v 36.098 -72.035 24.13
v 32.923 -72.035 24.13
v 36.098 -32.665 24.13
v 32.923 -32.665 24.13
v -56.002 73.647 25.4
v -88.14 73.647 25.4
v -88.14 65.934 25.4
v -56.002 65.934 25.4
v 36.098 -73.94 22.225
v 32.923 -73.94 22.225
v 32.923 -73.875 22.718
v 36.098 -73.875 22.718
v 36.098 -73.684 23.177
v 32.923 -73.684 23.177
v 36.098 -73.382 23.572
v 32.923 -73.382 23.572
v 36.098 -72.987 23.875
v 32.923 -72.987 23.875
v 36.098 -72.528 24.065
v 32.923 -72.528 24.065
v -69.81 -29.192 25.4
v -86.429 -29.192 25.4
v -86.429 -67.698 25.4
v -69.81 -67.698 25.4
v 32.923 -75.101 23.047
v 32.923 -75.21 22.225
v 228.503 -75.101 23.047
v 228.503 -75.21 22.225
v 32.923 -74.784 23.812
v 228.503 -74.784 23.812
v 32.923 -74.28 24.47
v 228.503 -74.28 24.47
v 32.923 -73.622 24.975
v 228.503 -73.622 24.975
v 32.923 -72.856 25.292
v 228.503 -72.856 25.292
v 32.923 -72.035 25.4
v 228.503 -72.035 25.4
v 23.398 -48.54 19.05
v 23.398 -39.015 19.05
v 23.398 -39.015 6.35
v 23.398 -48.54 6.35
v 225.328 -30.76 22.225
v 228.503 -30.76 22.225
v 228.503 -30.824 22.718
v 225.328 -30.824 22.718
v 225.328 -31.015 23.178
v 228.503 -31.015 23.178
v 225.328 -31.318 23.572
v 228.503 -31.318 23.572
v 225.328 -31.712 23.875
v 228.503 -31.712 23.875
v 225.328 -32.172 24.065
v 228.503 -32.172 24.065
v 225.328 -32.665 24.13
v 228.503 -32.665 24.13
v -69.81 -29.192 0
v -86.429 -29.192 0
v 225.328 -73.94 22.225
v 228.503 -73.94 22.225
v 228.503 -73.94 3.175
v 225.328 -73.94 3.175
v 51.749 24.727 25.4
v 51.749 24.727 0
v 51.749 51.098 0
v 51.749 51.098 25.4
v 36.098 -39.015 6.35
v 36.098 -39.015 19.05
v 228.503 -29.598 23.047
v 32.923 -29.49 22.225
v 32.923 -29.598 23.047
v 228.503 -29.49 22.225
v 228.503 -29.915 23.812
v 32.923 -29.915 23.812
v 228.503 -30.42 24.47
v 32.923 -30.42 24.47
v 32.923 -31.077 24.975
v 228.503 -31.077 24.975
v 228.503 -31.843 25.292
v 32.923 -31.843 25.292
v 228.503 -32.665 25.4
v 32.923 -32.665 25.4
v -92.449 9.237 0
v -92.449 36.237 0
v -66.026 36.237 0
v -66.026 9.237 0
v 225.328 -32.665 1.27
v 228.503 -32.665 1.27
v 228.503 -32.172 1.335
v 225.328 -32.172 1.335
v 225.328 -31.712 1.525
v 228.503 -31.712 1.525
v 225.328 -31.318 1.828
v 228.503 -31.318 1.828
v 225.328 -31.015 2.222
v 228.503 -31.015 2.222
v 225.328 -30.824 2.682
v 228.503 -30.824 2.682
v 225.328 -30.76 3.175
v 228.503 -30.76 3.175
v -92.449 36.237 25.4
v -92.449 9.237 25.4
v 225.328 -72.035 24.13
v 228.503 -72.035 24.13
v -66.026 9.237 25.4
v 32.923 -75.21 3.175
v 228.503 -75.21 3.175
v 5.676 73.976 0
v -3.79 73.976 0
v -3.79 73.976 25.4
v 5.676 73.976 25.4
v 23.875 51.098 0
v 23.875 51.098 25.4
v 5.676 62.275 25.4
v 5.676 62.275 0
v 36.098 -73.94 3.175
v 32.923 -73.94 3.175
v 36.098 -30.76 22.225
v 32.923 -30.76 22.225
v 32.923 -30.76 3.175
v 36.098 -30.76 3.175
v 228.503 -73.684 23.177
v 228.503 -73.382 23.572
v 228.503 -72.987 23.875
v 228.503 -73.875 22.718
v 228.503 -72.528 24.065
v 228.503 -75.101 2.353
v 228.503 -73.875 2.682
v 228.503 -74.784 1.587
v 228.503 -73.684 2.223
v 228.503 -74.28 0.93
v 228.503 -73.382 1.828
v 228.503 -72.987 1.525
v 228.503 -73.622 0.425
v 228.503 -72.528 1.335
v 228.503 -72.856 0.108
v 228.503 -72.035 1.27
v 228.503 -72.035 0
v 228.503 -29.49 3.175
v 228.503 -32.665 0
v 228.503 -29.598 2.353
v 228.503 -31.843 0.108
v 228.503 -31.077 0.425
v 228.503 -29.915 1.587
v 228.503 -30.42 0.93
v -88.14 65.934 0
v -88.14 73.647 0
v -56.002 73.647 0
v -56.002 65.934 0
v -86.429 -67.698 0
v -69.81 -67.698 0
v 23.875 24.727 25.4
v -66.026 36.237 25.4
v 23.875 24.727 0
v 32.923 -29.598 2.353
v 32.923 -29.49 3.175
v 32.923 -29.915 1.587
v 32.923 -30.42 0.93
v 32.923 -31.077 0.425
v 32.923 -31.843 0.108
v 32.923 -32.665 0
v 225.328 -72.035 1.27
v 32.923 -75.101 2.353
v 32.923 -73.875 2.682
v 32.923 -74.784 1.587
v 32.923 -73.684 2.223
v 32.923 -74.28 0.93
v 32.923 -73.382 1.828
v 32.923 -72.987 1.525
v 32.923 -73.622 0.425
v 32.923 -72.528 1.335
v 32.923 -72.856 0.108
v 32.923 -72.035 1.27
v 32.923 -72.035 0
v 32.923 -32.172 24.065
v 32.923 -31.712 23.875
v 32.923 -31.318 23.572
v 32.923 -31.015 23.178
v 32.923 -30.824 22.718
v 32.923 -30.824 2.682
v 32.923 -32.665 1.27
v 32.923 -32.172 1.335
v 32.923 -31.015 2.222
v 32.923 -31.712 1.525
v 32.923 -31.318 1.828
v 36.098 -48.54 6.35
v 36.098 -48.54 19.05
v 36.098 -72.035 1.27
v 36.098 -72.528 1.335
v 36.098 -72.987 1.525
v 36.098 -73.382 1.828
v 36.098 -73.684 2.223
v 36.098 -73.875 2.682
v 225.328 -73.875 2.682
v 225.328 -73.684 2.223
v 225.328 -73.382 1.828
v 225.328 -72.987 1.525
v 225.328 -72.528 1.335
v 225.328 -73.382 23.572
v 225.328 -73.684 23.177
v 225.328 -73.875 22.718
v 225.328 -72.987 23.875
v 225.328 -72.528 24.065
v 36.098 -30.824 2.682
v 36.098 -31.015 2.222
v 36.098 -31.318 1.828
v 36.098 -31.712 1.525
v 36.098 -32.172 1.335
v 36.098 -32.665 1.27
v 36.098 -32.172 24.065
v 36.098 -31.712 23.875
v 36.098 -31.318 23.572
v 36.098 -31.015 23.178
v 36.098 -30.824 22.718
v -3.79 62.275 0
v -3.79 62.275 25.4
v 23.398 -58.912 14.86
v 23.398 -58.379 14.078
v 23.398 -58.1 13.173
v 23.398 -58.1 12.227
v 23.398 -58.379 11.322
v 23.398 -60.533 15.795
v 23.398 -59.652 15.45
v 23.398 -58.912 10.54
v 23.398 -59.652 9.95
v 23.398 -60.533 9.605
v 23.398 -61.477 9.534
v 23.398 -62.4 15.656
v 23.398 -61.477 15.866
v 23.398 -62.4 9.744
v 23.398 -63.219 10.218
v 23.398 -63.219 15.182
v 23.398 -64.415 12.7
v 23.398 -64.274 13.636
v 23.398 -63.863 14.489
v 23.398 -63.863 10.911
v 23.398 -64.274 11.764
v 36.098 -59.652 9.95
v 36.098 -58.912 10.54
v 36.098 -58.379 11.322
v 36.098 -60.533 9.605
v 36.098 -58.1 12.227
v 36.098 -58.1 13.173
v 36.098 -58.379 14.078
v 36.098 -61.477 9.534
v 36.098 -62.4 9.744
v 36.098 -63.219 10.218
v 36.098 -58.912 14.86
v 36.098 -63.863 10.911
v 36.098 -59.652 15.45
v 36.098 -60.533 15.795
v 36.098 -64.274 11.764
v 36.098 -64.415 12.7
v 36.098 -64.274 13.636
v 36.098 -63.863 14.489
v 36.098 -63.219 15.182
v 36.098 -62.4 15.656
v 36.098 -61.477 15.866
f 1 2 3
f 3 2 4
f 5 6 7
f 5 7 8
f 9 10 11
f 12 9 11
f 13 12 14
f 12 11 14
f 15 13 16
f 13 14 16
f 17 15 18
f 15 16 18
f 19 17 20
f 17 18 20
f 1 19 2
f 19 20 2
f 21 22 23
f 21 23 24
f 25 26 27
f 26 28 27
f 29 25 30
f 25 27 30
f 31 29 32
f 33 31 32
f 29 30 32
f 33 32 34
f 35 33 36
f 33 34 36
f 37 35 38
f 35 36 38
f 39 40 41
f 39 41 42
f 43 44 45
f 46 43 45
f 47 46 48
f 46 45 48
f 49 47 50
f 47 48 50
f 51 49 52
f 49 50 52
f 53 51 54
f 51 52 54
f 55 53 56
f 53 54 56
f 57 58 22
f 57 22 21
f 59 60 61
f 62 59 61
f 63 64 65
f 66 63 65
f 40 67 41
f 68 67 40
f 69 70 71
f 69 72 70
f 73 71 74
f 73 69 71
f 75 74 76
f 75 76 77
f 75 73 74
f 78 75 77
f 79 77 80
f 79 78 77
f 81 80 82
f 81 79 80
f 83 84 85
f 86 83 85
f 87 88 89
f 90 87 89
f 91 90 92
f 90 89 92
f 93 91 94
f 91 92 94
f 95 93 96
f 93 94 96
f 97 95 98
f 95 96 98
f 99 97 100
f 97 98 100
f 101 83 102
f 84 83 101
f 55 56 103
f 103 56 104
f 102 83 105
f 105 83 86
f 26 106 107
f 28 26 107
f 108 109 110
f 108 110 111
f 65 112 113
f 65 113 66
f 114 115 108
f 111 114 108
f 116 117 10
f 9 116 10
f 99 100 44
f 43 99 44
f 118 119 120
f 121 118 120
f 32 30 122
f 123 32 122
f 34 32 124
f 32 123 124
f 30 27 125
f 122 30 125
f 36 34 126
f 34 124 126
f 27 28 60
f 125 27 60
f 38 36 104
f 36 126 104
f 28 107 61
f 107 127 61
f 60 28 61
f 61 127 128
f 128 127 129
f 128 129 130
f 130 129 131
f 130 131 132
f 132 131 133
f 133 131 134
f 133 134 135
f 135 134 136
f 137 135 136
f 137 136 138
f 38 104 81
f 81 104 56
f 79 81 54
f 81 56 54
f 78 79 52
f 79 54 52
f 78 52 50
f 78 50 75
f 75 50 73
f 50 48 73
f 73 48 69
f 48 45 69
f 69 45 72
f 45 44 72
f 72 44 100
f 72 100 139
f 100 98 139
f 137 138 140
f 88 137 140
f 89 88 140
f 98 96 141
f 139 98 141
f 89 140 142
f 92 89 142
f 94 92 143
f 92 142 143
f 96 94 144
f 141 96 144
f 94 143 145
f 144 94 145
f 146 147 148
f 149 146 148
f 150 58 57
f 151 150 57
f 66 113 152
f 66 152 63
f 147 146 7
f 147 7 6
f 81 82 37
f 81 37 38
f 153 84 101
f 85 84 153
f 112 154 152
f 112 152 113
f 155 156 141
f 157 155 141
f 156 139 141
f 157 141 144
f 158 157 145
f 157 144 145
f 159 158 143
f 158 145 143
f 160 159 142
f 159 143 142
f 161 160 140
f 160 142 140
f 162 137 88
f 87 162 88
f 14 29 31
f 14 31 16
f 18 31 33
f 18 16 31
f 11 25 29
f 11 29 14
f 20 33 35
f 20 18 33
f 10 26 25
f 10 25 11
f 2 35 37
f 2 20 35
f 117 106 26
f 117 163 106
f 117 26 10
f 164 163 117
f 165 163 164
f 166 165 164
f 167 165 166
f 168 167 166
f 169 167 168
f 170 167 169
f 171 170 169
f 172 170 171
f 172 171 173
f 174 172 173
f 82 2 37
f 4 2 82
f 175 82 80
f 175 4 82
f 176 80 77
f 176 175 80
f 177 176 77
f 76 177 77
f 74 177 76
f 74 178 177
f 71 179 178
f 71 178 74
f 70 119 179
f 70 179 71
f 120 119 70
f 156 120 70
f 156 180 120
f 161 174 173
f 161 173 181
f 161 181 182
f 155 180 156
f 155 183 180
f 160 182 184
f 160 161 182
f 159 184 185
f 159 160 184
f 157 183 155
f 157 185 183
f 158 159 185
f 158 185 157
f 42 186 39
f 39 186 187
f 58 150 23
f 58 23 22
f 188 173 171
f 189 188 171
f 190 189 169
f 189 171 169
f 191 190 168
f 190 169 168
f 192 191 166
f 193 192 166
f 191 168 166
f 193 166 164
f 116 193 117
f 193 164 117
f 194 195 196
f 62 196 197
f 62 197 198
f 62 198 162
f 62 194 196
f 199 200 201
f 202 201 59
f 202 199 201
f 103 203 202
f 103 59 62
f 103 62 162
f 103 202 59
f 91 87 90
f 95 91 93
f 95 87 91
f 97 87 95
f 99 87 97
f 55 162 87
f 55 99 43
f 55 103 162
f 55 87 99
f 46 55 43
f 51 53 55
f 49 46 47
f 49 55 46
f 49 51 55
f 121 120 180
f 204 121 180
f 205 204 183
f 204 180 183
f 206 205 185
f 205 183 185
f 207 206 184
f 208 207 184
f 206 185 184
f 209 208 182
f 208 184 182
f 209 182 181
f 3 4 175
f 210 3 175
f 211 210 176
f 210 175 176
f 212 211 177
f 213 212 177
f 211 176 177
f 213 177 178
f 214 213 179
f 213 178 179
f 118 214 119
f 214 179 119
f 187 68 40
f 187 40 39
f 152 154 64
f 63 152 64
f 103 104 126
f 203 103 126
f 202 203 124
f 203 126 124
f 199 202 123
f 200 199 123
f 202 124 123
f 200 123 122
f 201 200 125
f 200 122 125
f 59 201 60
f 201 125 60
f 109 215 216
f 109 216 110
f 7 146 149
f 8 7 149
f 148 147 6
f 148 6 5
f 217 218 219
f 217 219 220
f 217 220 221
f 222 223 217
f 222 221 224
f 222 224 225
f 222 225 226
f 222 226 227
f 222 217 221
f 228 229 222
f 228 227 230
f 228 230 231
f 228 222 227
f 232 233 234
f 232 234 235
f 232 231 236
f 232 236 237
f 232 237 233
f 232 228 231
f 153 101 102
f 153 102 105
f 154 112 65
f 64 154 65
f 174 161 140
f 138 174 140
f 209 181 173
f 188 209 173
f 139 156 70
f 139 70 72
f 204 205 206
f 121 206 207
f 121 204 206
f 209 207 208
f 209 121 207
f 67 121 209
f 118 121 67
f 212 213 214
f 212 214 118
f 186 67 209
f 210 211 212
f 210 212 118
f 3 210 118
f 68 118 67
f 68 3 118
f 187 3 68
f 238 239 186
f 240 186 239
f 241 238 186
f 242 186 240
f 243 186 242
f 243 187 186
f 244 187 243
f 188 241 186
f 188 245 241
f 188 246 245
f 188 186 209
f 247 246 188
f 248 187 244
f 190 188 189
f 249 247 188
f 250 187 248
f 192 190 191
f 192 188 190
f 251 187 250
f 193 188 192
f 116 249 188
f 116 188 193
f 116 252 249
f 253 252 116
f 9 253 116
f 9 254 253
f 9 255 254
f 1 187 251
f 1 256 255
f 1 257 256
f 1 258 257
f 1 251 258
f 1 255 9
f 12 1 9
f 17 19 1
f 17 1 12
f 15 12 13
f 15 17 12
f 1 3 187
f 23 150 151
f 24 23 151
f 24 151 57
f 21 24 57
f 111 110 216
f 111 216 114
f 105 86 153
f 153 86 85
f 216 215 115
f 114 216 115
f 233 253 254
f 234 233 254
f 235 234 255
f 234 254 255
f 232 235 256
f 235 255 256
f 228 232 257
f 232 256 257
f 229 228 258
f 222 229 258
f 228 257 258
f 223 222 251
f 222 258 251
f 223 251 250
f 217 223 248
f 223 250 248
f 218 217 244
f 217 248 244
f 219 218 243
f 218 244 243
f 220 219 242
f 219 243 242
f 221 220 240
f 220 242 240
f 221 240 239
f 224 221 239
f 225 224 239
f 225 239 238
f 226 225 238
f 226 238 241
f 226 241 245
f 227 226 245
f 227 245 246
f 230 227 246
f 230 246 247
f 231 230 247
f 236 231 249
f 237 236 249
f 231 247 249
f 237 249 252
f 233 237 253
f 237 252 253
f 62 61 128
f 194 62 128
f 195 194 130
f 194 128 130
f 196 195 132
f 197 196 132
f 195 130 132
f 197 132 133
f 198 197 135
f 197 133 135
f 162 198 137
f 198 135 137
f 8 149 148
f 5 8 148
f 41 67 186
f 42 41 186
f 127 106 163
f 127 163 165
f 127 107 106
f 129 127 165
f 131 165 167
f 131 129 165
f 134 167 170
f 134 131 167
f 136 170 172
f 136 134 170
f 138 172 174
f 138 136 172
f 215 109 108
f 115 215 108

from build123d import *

# Parameters (mm, degrees)
F0_W     = 16.618398
F0_H     = 38.506252
F0_W_2   = 26.423264
F0_H_2   = 27.000825
F0_W_3   = 32.138111
F0_H_3   = 7.713083
F0_W_4   = 9.466055
F0_H_4   = 11.701052
F0_W_5   = 27.874055
F0_H_5   = 26.37086
F0_W_6   = 195.58
F0_H_6   = 45.72
F1_DEPTH = 25.4
F2_R     = 3.175
F4_DEPTH = 3.175
F6_DEPTH = 3.175
F7_W     = 9.525
F7_H     = 12.7
F7_R     = 3.175
F8_DEPTH = 12.7


with BuildPart() as f1:
    # F0 (on Top) → F1 (new body)
    with BuildSketch(Plane.XY):
        with Locations((-78.119632, -48.44503)):
            Rectangle(F0_W, F0_H)
        with Locations((-79.23726, 22.737014)):
            Rectangle(F0_W_2, F0_H_2)
        with Locations((-72.070883, 69.790199)):
            Rectangle(F0_W_3, F0_H_3)
        with Locations((0.943256, 68.12576)):
            Rectangle(F0_W_4, F0_H_4)
        with Locations((37.811639, 37.912922)):
            Rectangle(F0_W_5, F0_H_5)
        with Locations((130.713382, -52.349573)):
            Rectangle(F0_W_6, F0_H_6)
    extrude(amount=F1_DEPTH)

    # F2
    f2_edges = [f1.edges().sort_by_distance(p)[0] for p in [
        (130.713382, -75.209573, 25.4),
        (130.713382, -75.209573, 0),
        (130.713382, -29.489573, 0),
        (130.713382, -29.489573, 25.4),
    ]]
    fillet(f2_edges, radius=F2_R)

    # F3 (on face) → F4 (cut)
    with BuildSketch(Plane.YZ.offset(228.503382)):
        with BuildLine():
            ThreePointArc((-73.939573, 22.225), (-72.034573, 20.32), (-70.129573, 22.225))
            ThreePointArc((-70.129573, 22.225), (-70.687534, 23.572038), (-72.034573, 24.13))
            ThreePointArc((-72.034573, 24.13), (-73.381611, 23.572038), (-73.939573, 22.225))
        make_face()
        with BuildLine():
            ThreePointArc((-72.034573, 24.13), (-70.687534, 23.572038), (-70.129573, 22.225))
            ThreePointArc((-70.129573, 22.225), (-72.034573, 20.32), (-73.939573, 22.225))
            Line((-73.939573, 22.225), (-73.939573, 3.175))
            ThreePointArc((-73.939573, 3.175), (-72.034573, 5.08), (-70.129573, 3.175))
            ThreePointArc((-70.129573, 3.175), (-70.687534, 1.827962), (-72.034573, 1.27))
            Line((-72.034573, 1.27), (-32.664573, 1.27))
            ThreePointArc((-32.664573, 1.27), (-34.011611, 4.522038), (-30.759573, 3.175))
            Line((-30.759573, 3.175), (-30.759573, 22.225))
            ThreePointArc((-30.759573, 22.225), (-34.011611, 20.877962), (-32.664573, 24.13))
            Line((-32.664573, 24.13), (-72.034573, 24.13))
        make_face()
        with BuildLine():
            ThreePointArc((-30.759573, 22.225), (-31.317534, 23.572038), (-32.664573, 24.13))
            ThreePointArc((-32.664573, 24.13), (-34.011611, 20.877962), (-30.759573, 22.225))
        make_face()
        with BuildLine():
            ThreePointArc((-70.129573, 3.175), (-72.034573, 5.08), (-73.939573, 3.175))
            ThreePointArc((-73.939573, 3.175), (-73.381611, 1.827962), (-72.034573, 1.27))
            ThreePointArc((-72.034573, 1.27), (-70.687534, 1.827962), (-70.129573, 3.175))
        make_face()
        with BuildLine():
            ThreePointArc((-32.664573, 1.27), (-31.317534, 1.827962), (-30.759573, 3.175))
            ThreePointArc((-30.759573, 3.175), (-34.011611, 4.522038), (-32.664573, 1.27))
        make_face()
    extrude(amount=-F4_DEPTH, mode=Mode.SUBTRACT)

    # F5 (on face) → F6 (cut)
    with BuildSketch(Plane(origin=(32.923382, 0, 0), x_dir=(0, -1, 0), z_dir=(-1, 0, 0))):
        with BuildLine():
            ThreePointArc((30.759573, 22.225), (32.664573, 20.32), (34.569573, 22.225))
            ThreePointArc((34.569573, 22.225), (34.011611, 23.572038), (32.664573, 24.13))
            ThreePointArc((32.664573, 24.13), (31.317534, 23.572038), (30.759573, 22.225))
        make_face()
        with BuildLine():
            ThreePointArc((32.664573, 24.13), (34.011611, 23.572038), (34.569573, 22.225))
            ThreePointArc((34.569573, 22.225), (32.664573, 20.32), (30.759573, 22.225))
            Line((30.759573, 22.225), (30.759573, 3.175))
            ThreePointArc((30.759573, 3.175), (32.664573, 5.08), (34.569573, 3.175))
            ThreePointArc((34.569573, 3.175), (34.011611, 1.827962), (32.664573, 1.27))
            Line((32.664573, 1.27), (72.034573, 1.27))
            ThreePointArc((72.034573, 1.27), (70.687534, 4.522038), (73.939573, 3.175))
            Line((73.939573, 3.175), (73.939573, 22.225))
            ThreePointArc((73.939573, 22.225), (70.687534, 20.877962), (72.034573, 24.13))
            Line((72.034573, 24.13), (32.664573, 24.13))
        make_face()
        with BuildLine():
            ThreePointArc((73.939573, 22.225), (73.381611, 23.572038), (72.034573, 24.13))
            ThreePointArc((72.034573, 24.13), (70.687534, 20.877962), (73.939573, 22.225))
        make_face()
        with BuildLine():
            ThreePointArc((34.569573, 3.175), (32.664573, 5.08), (30.759573, 3.175))
            ThreePointArc((30.759573, 3.175), (31.317534, 1.827962), (32.664573, 1.27))
            ThreePointArc((32.664573, 1.27), (34.011611, 1.827962), (34.569573, 3.175))
        make_face()
        with BuildLine():
            ThreePointArc((72.034573, 1.27), (73.381611, 1.827962), (73.939573, 3.175))
            ThreePointArc((73.939573, 3.175), (70.687534, 4.522038), (72.034573, 1.27))
        make_face()
    extrude(amount=-F6_DEPTH, mode=Mode.SUBTRACT)

    # F7 (on face) → F8 (join)
    with BuildSketch(Plane(origin=(36.098382, 0, 0), x_dir=(0, -1, 0), z_dir=(-1, 0, 0))):
        with Locations((43.777073, 12.7)):
            Rectangle(F7_W, F7_H)
        with Locations((61.239573, 12.7)):
            Circle(F7_R)
    extrude(amount=F8_DEPTH)


solid = f1.part
